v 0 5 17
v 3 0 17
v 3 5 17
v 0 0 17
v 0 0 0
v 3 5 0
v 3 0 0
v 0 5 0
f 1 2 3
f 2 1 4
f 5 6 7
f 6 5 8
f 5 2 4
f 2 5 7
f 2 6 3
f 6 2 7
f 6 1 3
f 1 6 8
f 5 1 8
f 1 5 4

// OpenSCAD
// Generated by SolidPython 1.0.1 on 2020-07-29 00:39:26


cube(size = [3, 5, 17]);
/***********************************************
*********      SolidPython code:      **********
************************************************
 
# import packages: SolidPython
from solid import *
from solid.utils import *
from itertools import chain, combinations


class Resize:

    def __init__(self, scad_file):
        self.scad_file = scad_file
        #self.scad_file = import_scad(scad_file)
        # cone/cylinder param:
        self.r1 = 0
        self.r2 = 0
        self.h = 0
        # rectangular prism param:
        self.w = 0
        self.l = 0
        # ellipse param:
        self.r = 0

    # import OpenScad code (file name corresponds to shape)


    # classify shape + parameters
    def assign(self, param1, param2, param3):
        if self.scad_file == 'cone.scad':
            self.r1 = param1
            self.r2 = param2
            self.h = param3
        elif self.scad_file == 'cylinder.scad':
            self.r1 = param1
            self.r2 = param2
            self.h = param3
        elif self.scad_file == 'rectangularPrism.scad':
            self.h = param1
            self.l = param2
            self.w = param3
        else:
            self.r = param1
            self.h = param2

    # resize parameters
    def iterate(self):
        x = range(3, 20, 2)
        i = 1
        if self.scad_file == 'cone.scad':
            tempList = list(combinations(x, 2))
            for temp in tempList:
                param1 = temp[0]
                param2 = temp[1]
                filepath = 'produced_scad_files/' + 'cone' + str(param1) + '_' + str(param2) + '_' + '.scad'
                scad_render_to_file(cylinder(h=param1, r1=param2, r2=0), filepath)

        elif self.scad_file == 'cylinder.scad':
            tempList = list(combinations(x, 3))
            for temp in tempList:
                param1 = temp[0]
                param2 = temp[1]
                filepath = 'produced_scad_files/' + 'cylinder' + str(param1) + '_' + str(param2) + '_' + '.scad'
                scad_render_to_file(cylinder(h=param1, r1=param2, r2=param2), filepath)

        elif self.scad_file == 'rectangularPrism.scad':
            tempList = list(combinations(x, 3))
            for temp in tempList:
                param1 = temp[0]
                param2 = temp[1]
                param3 = temp[2]
                filepath = 'produced_scad_files/' + 'rectangularPrism' + str(param1) + '_' + str(param2) + '_' + str(
                    param3) + '.scad'
                scad_render_to_file(cube(size=(param1, param2, param3)), filepath)

        elif self.scad_file == 'ellipse.scad':
            tempList = list(combinations(x, 4))
            for temp in tempList:
                param1 = temp[0]
                param2 = temp[1]
                param3 = temp[2]
                param4 = temp[3]
                filepath = 'produced_scad_files/' + 'ellipse' + str(param1) + '_' + str(param2) + '_' + str(param3) + '_' + str(param4) + '.scad'
                scad_render_to_file(scale([param1, param2, param3])(sphere(r=param4)), filepath)

    def render_to_scadfile(self):
        scad_render_to_file(scad, 'example.scad') 
 
************************************************/
